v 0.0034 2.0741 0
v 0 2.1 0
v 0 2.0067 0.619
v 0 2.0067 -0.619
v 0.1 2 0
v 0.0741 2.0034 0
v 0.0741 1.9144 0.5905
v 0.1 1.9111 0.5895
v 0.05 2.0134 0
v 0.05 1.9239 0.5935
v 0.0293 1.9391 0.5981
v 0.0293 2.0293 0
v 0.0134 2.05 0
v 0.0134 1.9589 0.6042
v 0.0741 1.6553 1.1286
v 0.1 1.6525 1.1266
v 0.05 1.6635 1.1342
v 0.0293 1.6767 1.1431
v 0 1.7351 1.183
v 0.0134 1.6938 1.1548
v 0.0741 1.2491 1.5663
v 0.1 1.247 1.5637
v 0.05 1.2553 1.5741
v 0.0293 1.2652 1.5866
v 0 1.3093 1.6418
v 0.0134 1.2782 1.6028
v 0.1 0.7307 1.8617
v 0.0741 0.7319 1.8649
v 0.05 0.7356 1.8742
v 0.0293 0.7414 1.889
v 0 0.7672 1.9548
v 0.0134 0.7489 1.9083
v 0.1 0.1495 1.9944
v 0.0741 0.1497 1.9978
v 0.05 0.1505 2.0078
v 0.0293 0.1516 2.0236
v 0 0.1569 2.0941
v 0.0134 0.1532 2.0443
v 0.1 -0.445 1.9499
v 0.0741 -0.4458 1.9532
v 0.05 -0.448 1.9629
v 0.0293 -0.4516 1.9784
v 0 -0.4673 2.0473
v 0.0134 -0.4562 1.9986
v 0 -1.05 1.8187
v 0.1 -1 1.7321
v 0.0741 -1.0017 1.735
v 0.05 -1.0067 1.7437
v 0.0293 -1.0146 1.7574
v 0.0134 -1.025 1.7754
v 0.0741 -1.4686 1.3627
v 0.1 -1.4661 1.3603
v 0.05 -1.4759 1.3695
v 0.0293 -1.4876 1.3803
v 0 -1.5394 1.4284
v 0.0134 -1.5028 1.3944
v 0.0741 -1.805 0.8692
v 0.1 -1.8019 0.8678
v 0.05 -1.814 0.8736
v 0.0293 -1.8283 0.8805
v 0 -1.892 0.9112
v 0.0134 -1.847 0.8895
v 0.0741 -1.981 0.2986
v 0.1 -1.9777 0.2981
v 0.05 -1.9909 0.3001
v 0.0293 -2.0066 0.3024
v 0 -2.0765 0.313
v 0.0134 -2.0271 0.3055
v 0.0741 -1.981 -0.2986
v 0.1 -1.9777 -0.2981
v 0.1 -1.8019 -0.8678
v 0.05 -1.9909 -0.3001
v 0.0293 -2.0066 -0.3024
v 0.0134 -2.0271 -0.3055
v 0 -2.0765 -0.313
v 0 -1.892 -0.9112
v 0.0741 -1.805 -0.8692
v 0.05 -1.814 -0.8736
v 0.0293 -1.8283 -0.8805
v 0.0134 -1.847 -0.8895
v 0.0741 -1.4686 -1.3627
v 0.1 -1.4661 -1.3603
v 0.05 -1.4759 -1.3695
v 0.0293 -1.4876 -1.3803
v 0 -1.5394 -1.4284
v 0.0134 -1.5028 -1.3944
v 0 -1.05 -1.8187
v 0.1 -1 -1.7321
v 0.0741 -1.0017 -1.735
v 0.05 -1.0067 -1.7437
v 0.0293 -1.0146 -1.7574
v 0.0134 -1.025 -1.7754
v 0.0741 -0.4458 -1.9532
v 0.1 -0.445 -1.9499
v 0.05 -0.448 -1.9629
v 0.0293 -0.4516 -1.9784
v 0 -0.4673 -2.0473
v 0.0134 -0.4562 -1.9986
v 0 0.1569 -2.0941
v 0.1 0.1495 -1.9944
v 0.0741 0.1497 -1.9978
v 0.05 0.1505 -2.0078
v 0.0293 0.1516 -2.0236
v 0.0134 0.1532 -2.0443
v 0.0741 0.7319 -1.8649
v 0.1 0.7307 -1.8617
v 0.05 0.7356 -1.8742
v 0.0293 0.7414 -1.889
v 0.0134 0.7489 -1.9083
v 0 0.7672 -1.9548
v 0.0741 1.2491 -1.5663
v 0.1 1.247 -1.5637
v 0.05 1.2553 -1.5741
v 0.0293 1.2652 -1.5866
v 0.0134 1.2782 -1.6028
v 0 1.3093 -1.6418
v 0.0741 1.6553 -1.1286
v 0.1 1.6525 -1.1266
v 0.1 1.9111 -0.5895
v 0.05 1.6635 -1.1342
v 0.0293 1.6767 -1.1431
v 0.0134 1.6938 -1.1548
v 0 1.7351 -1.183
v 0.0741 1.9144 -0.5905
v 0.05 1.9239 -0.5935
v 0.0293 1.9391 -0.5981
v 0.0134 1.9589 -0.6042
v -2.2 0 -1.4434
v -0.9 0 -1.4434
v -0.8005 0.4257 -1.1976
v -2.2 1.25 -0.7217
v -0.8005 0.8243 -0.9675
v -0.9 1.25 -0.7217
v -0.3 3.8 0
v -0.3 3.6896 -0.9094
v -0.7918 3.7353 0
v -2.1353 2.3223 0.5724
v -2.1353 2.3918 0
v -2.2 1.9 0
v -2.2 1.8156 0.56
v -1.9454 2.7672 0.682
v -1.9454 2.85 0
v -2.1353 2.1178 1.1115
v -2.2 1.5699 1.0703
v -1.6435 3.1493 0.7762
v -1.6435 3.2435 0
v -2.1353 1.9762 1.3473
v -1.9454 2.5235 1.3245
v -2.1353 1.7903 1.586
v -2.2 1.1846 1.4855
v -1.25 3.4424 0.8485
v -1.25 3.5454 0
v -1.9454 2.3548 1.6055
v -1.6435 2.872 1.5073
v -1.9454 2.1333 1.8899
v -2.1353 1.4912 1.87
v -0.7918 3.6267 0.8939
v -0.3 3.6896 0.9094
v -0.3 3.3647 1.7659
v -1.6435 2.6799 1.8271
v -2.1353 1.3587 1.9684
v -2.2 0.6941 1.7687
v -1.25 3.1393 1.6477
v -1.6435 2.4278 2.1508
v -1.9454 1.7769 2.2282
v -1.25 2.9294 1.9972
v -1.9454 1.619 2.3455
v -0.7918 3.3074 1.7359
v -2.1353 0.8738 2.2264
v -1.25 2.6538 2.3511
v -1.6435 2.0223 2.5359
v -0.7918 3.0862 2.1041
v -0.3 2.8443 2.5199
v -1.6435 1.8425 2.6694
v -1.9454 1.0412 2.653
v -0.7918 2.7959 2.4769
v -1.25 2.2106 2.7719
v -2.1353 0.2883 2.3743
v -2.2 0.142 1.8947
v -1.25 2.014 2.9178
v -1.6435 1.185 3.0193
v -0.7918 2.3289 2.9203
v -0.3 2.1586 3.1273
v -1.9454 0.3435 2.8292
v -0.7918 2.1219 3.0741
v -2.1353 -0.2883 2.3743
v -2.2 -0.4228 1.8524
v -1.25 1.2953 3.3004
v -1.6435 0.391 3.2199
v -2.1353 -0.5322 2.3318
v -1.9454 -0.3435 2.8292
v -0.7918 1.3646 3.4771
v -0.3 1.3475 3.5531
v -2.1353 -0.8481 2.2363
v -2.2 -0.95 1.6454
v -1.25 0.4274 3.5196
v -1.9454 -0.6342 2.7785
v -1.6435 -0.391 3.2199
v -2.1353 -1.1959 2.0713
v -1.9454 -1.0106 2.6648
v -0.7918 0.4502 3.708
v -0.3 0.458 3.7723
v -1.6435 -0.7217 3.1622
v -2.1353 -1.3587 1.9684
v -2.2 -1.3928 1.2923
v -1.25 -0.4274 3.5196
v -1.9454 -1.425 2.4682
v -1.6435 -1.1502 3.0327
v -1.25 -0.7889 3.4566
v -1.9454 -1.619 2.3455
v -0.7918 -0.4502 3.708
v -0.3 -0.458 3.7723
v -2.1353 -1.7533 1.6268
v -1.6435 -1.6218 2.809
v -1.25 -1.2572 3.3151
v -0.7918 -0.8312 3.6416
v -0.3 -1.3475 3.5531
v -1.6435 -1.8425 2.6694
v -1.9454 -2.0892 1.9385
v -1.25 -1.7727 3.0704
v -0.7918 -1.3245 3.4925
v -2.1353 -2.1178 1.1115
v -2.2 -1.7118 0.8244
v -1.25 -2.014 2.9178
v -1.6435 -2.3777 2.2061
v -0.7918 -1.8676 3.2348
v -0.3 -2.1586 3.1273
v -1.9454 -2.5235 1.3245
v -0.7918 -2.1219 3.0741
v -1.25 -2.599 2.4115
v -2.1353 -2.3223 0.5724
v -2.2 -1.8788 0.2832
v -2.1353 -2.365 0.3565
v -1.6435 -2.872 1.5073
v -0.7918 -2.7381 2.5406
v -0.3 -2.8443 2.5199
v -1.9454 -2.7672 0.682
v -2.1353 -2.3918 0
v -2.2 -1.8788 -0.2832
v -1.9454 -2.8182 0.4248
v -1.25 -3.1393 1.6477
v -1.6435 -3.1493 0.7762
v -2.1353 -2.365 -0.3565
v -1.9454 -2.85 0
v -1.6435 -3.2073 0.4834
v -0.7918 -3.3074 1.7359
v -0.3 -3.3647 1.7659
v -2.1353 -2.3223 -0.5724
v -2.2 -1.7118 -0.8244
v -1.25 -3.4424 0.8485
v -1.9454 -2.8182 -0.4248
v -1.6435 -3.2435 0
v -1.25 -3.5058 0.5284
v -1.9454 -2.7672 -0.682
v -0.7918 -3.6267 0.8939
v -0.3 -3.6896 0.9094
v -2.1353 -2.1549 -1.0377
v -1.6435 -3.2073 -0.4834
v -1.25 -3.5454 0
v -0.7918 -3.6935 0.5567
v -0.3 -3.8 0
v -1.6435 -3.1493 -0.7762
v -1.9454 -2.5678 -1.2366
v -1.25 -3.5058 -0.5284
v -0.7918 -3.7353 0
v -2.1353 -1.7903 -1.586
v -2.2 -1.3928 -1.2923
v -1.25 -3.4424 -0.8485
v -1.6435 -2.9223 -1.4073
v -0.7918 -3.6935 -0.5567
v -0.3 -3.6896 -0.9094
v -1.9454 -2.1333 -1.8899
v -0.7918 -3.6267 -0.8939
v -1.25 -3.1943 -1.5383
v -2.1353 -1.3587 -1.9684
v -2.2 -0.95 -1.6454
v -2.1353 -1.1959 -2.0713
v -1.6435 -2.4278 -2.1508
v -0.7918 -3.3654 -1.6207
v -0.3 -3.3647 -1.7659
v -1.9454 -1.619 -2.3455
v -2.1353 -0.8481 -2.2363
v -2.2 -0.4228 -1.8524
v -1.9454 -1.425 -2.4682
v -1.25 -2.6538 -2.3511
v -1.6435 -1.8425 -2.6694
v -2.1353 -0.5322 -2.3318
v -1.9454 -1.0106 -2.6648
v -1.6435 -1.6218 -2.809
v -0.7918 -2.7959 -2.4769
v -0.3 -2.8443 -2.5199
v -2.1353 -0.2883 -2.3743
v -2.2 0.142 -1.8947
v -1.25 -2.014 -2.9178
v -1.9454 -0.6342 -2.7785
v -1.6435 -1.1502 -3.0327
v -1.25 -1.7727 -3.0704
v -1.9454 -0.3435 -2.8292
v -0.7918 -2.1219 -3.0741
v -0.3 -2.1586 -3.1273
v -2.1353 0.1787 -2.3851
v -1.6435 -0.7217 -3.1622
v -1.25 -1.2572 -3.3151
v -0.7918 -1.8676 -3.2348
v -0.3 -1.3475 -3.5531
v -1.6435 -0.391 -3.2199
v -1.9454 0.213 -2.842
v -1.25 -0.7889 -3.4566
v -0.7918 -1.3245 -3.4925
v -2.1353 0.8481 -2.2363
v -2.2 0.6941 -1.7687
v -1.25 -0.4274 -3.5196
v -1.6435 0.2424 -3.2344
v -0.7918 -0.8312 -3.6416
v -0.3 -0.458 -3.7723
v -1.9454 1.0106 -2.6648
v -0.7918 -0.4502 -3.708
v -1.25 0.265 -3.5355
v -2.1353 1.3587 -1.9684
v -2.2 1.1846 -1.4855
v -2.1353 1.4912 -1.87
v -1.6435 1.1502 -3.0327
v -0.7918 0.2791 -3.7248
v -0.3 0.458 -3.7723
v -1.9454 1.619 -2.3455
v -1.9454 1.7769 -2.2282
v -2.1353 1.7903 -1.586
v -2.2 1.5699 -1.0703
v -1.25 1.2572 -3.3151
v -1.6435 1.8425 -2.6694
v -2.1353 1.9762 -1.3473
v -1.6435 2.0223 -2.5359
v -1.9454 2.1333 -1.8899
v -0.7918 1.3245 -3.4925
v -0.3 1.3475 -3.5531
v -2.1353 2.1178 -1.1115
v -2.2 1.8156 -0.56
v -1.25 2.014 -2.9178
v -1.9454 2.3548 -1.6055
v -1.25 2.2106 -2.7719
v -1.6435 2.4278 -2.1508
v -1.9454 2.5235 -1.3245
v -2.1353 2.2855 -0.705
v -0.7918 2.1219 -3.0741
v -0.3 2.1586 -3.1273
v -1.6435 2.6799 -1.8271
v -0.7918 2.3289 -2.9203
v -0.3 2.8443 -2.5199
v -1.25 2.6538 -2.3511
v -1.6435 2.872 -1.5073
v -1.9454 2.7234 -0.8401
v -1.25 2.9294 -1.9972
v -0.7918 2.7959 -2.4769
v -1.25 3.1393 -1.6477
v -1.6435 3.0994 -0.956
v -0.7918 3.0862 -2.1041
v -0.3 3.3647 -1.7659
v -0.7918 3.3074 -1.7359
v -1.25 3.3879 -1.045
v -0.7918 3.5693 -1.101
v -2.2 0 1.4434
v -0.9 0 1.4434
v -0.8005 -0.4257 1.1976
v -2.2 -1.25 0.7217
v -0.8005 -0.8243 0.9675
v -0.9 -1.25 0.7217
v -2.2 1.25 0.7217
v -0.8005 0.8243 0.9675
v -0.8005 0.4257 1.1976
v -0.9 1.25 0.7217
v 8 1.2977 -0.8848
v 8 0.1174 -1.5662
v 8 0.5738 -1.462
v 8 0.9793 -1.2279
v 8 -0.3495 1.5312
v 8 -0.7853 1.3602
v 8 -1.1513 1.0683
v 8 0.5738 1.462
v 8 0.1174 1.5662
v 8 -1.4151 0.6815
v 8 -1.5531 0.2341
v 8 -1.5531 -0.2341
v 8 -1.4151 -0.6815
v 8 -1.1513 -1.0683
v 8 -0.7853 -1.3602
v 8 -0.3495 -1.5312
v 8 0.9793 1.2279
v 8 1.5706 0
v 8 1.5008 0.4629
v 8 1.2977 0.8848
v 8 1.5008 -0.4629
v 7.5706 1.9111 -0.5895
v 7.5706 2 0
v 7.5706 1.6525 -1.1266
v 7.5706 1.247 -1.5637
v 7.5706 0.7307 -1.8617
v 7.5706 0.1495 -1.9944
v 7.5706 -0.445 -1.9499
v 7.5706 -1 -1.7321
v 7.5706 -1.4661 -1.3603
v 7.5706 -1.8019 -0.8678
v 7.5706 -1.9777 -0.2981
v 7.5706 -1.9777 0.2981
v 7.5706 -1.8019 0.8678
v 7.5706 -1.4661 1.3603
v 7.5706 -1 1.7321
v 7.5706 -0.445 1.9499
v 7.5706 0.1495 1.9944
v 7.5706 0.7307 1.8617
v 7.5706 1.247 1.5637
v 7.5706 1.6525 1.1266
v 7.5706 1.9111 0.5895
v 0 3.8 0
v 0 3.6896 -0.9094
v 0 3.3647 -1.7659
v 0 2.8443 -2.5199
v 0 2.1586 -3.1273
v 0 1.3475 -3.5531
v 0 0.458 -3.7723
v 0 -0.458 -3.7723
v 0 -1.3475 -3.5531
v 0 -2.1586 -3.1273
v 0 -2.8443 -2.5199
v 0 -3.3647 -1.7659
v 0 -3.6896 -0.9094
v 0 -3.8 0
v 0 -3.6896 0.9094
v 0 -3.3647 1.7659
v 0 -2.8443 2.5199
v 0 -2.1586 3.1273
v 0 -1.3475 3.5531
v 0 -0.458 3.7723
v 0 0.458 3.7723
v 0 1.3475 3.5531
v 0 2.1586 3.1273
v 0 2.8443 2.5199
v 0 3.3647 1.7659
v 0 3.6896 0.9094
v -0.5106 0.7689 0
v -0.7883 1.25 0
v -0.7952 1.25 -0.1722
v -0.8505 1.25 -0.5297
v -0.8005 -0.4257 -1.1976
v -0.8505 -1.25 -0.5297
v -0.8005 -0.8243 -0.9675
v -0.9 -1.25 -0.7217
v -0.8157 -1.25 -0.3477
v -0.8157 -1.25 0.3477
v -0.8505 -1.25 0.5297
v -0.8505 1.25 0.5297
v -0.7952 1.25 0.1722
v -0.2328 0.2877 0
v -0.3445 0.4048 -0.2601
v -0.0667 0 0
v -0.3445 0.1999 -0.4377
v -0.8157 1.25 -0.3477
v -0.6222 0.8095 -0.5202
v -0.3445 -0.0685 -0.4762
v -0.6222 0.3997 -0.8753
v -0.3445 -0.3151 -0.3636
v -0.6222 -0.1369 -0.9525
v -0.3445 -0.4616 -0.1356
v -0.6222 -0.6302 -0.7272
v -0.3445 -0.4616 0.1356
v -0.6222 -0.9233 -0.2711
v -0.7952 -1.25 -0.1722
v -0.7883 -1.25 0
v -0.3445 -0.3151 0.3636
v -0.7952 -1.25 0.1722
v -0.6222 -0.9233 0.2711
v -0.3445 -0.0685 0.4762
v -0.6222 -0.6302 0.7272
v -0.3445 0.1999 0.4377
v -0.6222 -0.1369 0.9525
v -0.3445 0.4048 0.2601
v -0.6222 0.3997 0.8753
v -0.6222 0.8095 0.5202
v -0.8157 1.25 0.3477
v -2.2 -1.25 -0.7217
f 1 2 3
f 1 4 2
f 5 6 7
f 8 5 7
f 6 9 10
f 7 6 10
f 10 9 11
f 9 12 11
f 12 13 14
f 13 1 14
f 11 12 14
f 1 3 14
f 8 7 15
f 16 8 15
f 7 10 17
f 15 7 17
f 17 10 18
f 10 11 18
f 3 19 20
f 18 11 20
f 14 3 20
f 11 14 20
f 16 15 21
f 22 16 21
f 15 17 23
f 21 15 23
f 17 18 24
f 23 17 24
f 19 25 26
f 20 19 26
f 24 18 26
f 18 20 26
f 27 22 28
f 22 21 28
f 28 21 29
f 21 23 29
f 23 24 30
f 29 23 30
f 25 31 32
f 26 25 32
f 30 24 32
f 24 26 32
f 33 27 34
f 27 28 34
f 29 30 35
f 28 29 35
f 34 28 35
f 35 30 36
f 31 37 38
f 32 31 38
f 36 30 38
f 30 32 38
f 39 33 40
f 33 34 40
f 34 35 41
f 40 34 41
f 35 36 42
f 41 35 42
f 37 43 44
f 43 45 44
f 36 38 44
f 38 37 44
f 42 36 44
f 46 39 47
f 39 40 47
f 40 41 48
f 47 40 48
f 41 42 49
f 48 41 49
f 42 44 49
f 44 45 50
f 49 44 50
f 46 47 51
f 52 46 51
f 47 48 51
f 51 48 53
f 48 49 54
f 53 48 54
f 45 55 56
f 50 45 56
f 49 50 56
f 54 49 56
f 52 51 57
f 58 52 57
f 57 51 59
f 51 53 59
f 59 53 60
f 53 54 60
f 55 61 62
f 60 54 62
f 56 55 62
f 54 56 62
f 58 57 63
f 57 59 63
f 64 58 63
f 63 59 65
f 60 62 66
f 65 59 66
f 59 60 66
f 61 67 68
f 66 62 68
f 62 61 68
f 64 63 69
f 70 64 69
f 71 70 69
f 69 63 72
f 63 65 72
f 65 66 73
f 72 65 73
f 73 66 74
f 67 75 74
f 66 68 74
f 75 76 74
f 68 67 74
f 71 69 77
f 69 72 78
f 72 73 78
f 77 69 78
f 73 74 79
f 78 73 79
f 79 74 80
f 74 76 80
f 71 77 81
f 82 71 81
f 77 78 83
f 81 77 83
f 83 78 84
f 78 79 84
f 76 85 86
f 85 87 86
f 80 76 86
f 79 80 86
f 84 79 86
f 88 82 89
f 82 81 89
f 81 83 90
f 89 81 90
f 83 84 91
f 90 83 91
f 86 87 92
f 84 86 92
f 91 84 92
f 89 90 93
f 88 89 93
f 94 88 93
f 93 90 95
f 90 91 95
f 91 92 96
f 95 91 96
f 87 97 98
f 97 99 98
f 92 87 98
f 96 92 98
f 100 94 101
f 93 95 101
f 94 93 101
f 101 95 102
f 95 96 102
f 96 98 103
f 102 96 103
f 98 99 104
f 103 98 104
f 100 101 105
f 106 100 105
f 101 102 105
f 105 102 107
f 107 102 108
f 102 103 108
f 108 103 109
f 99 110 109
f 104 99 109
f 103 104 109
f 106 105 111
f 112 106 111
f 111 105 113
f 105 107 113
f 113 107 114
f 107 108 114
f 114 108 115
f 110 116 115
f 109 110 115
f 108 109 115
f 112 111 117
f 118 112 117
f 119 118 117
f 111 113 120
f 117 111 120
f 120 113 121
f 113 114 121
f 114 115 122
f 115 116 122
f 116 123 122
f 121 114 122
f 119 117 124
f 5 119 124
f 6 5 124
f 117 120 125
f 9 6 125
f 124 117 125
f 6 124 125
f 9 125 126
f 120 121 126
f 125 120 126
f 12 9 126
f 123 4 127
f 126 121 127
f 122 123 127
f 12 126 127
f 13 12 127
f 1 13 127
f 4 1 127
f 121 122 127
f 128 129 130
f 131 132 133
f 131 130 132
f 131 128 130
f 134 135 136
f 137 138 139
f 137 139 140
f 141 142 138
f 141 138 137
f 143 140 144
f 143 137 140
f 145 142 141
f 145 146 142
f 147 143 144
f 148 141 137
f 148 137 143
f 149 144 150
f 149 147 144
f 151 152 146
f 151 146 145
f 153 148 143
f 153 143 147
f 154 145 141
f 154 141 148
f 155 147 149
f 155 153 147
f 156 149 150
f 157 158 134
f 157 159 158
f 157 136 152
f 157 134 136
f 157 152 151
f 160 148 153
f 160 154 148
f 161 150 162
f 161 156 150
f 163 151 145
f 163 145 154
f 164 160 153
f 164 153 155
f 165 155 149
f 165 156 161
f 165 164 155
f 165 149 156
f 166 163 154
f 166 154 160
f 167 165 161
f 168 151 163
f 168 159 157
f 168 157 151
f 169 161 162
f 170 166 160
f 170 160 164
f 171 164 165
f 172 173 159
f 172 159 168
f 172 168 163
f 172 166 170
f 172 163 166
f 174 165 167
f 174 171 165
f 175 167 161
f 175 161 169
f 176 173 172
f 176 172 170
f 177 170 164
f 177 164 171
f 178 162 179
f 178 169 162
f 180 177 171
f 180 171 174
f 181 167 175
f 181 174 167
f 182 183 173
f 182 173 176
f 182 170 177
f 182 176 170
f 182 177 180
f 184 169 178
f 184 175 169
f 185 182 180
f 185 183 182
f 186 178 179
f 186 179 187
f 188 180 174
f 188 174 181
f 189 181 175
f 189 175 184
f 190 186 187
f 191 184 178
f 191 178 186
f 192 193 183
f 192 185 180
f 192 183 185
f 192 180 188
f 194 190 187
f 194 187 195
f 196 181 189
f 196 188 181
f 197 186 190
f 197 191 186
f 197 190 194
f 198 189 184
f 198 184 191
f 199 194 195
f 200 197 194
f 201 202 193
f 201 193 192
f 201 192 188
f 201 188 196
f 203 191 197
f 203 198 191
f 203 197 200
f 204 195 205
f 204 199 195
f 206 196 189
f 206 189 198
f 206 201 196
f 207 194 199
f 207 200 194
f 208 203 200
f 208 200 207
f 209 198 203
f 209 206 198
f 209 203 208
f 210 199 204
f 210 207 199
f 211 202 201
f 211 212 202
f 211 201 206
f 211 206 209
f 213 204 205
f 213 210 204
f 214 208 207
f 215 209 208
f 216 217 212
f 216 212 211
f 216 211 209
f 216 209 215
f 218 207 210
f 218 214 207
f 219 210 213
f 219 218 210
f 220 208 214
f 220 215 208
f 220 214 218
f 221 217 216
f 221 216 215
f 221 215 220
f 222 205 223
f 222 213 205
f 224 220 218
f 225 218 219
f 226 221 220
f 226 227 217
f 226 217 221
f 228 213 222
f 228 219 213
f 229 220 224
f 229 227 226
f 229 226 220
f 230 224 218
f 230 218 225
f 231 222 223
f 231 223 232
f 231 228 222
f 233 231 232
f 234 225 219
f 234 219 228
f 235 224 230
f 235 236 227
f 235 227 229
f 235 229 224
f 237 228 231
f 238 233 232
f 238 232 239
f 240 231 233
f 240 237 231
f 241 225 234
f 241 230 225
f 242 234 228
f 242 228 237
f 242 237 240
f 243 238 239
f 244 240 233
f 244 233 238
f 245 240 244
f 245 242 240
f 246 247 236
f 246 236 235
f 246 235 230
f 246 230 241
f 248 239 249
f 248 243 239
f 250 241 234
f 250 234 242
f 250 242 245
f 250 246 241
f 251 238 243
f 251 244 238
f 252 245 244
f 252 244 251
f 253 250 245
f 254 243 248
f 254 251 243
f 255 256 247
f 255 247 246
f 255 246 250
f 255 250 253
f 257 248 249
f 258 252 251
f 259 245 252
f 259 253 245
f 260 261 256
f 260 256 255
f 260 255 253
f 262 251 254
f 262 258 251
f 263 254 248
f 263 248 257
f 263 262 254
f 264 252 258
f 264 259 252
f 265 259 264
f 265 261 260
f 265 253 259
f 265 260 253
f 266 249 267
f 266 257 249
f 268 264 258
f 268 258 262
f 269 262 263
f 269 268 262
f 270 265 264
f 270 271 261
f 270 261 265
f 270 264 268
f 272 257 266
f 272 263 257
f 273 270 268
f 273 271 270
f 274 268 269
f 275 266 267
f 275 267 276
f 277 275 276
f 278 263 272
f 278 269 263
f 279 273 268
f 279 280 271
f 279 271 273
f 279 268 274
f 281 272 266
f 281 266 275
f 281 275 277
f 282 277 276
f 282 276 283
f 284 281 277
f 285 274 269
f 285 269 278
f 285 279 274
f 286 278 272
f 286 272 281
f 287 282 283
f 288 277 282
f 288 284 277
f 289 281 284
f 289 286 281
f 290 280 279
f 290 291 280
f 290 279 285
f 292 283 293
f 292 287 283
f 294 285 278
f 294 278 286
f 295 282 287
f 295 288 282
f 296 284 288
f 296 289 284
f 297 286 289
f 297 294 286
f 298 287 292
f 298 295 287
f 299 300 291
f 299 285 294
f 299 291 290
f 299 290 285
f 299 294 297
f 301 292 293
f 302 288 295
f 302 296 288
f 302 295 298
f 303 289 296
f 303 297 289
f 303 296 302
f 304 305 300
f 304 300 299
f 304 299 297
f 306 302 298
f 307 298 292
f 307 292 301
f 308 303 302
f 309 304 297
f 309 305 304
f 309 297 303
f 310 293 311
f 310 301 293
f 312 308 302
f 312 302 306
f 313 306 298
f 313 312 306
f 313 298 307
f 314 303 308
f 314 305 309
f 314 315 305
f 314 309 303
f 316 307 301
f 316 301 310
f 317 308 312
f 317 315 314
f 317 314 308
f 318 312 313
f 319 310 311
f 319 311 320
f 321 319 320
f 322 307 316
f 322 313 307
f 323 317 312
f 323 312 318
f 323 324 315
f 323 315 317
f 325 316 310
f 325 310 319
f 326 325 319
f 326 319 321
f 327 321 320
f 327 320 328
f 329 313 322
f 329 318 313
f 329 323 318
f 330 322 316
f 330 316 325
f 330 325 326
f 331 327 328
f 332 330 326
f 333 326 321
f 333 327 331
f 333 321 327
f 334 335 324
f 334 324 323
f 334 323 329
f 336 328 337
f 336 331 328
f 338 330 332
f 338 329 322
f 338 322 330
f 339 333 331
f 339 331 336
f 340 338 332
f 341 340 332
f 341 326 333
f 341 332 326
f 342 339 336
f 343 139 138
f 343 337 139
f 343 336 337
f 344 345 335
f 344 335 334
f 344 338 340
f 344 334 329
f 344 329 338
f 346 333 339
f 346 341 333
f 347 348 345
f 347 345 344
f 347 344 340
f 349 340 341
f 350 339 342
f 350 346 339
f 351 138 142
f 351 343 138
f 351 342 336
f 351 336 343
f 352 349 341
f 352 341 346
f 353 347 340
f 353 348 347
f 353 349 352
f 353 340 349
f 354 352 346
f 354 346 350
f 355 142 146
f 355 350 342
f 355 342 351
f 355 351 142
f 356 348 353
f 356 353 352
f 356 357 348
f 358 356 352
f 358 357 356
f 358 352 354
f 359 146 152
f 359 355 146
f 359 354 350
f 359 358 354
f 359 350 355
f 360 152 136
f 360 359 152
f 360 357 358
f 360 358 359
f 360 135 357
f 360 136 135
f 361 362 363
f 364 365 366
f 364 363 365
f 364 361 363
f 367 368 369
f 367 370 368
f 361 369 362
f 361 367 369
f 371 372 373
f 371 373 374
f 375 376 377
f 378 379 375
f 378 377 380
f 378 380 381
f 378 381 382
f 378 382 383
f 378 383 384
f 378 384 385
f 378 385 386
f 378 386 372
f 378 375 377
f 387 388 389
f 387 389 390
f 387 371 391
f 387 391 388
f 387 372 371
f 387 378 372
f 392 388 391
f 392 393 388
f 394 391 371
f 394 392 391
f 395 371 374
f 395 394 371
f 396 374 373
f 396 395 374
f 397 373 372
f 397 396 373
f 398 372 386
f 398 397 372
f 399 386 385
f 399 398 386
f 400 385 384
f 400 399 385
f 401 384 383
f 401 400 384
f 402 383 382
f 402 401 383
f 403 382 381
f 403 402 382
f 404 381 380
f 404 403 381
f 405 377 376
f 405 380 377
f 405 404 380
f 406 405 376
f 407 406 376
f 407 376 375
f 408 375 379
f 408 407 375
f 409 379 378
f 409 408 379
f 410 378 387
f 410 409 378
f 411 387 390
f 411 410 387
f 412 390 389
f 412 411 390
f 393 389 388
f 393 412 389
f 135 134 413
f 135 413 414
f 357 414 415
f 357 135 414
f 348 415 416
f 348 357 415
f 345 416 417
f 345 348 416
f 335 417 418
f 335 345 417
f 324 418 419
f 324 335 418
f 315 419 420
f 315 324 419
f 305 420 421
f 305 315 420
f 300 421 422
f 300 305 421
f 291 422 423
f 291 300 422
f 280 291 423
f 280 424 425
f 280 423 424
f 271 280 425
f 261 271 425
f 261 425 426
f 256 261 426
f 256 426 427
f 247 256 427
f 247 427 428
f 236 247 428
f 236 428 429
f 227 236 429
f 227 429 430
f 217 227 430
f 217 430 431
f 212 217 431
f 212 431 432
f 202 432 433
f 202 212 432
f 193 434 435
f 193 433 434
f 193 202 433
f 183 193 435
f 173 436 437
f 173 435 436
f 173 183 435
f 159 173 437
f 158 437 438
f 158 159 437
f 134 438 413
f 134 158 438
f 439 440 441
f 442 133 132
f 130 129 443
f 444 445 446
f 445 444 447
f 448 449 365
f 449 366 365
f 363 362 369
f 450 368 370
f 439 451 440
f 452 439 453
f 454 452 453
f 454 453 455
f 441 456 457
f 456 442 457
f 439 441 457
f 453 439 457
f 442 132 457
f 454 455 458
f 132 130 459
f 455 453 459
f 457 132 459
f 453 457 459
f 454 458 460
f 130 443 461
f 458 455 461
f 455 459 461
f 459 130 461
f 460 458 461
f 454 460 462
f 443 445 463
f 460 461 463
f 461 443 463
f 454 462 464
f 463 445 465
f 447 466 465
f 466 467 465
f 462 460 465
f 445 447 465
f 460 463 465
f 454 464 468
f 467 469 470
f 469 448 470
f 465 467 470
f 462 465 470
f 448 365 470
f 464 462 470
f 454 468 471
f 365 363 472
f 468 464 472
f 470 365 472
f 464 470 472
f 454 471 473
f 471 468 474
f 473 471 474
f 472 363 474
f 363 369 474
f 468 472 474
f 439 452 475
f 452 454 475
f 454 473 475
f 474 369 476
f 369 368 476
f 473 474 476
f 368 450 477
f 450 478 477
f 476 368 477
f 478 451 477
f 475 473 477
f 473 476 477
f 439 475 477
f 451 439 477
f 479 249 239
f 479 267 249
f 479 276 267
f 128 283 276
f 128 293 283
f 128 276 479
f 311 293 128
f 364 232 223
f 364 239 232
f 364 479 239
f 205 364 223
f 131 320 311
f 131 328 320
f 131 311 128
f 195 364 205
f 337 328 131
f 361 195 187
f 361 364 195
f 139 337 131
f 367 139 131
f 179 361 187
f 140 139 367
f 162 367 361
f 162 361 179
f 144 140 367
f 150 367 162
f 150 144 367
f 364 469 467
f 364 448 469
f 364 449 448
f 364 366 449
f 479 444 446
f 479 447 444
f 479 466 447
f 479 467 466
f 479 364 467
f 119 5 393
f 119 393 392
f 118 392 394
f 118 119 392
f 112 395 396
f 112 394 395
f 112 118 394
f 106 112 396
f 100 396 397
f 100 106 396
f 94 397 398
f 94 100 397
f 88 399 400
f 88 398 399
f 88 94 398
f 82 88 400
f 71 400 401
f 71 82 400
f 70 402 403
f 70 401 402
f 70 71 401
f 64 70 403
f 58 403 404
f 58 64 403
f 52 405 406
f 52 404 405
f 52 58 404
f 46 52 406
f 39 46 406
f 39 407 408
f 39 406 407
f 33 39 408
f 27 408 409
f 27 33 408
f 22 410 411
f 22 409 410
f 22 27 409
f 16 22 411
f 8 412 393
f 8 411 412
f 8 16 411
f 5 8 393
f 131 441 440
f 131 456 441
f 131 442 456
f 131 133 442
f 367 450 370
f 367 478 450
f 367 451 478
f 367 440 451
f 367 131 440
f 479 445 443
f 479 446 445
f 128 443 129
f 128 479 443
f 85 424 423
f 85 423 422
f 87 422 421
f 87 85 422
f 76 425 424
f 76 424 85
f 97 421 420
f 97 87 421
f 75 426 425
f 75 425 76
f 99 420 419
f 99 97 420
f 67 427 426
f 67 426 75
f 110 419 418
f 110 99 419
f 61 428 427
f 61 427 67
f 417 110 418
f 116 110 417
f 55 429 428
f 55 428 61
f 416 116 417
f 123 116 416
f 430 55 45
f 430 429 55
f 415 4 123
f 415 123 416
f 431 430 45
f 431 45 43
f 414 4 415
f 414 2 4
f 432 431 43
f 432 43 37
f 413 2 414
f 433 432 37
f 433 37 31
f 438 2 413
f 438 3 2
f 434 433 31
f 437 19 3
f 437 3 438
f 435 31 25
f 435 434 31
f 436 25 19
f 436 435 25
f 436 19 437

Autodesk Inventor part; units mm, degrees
ref_plane "YZ Plane" through (0, 0, 0) normal (1, 0, 0) x (0, 1, 0)
ref_plane "XZ Plane" through (0, 0, 0) normal (0, 1, 0) x (-1, 0, 0)
sketch "Sketch1" plane through (0, 0, 0) normal (0, 0, 1) x (1, 0, 0)
  line L0 (-0.0667, 0) -> (8, 0)
  line L1 (8, 0) -> (8, 2)
  line L2 (8, 2) -> (1.4, 2)
  line L3 (1.4, 2) -> (0.9705, 2)
  line L4 (0.9705, 2) -> (0, 2)
  line L5 (0, 2) -> (0, 3.8)
  line L6 (0, 3.8) -> (-2.2, 3.8)
  line L7 (-2.2, 3.8) -> (-2.2, 1.4434)
  line L8 (-2.2, 1.4434) -> (-0.9, 1.4434)
  line L9 (-0.9, 1.4434) -> (-0.0667, 0)
  line L10 (-4.24, 0) -> (10.04, 0) projected
  line L11 (0, -0.76) -> (0, 4.56) projected
  line L12 (1.4, 2) -> (0, 2) construction
  dimension "d1" = 6.6
  dimension "d2" = 0.4295
  dimension "d3" = 2.2
  dimension "d4" = 1.3
  dimension "d5" = 60
  dimension "d6" = 4
  dimension "d7" = 4
  dimension "d8" = 2.8868
  dimension "d9" = 7.6
  dimension "d26" = 8
revolve "Body" add sketch "Sketch1" angle 360 about axis through (-0.0667, 0, 0) along (1, 0, 0)
sketch "Sketch2" plane through (-2.2, 0, 0) normal (-1, 0, 0) x (0, 0, 1)
  circle A0 centre (0, 0) radius 1.4434 projected
  line L0 (0, -5.32) -> (0, 5.32) projected
  line L1 (-5.32, 0) -> (5.32, 0) projected
  line L2 (1.4434, 0) -> (0.7217, -1.25)
  line L3 (0.7217, -1.25) -> (-0.7217, -1.25)
  line L4 (-0.7217, -1.25) -> (-1.4434, 0)
  line L5 (-1.4434, 0) -> (-0.7217, 1.25)
  line L6 (-0.7217, 1.25) -> (0.7217, 1.25)
  line L7 (0.7217, 1.25) -> (1.4434, 0)
  point P0 (0, 0)
extrude "Slot" add sketch "Sketch2" against normal up to next contours L7 A0 | A0 L2 | L6 L0 A0 | A0 L0 L3 | L0 L6 A0 | A0 L3 L0 | L4 A0 | A0 L5
fillet "Fillet1" radius 1.9 1 edges at (-2.2, -3.8, 0)
thread "Thread" size "M4x0.7" class "6g" standard "ISO Metric profile" length 6.6
chamfer "Chamfer1" distance 0.4294 distance2 0.4294 1 edges at (8, -2, 0) measured on face at (8, 0.556, 0.0273)
ref_plane "Work Plane1" through (29, 0, 0) normal (0, -1, 0) x (1, 0, 0)
fillet "Fillet2" radius 0.1 1 edges at (0, -2, 0)
equation "\"d1\" = GEL"
equation "\"d3\" = KOH"
equation "\"d4\" = INTI"
equation "\"d6\" = GD"
equation "\"d7\" = BDM"
equation "\"d8\" = 1.1547 * SW"
equation "\"d9\" = KOD"
equation "\"d26\" = NLG"
equation "\"d30\" = R"
equation "\"d17\" = RR"
equation "\"d13\" = GEL"
equation "\"d15\" = -0.5 * SPD + 0.5 * GD"
equation "\"d16\" = GUL"
equation "\"GD\" = NND"
equation "\"NLG\" = 8"
equation "\"GEL\" = 6.6"
equation "\"KOD\" = 7.6"
equation "\"KOH\" = 2.2"
equation "\"INTI\" = 1.3"
equation "\"GAL\" = 0.61345 * PTC"
equation "\"GUL\" = 0.61345 * PTC"
equation "\"BDM\" = NND"
equation "\"SW\" = 2.5"
equation "\"RR\" = 1.9"
equation "\"SPD\" = NND - 1.2269 * PTC"
equation "\"R\" = 0.1"
equation "\"TOA\" = 30deg"
equation "\"GD1\" = THREADDIA - 1.2269 * PTC"
equation "\"THREADDIA\" = 4"
equation "\"PTC\" = 0.7"
equation "\"NND\" = 4"
equation "\"KOH1\" = 0.3"
equation "\"E0\" = 1.155 * SW"
properties part number "BS 4168 - M4 x 8" material "Steel, Mild"
